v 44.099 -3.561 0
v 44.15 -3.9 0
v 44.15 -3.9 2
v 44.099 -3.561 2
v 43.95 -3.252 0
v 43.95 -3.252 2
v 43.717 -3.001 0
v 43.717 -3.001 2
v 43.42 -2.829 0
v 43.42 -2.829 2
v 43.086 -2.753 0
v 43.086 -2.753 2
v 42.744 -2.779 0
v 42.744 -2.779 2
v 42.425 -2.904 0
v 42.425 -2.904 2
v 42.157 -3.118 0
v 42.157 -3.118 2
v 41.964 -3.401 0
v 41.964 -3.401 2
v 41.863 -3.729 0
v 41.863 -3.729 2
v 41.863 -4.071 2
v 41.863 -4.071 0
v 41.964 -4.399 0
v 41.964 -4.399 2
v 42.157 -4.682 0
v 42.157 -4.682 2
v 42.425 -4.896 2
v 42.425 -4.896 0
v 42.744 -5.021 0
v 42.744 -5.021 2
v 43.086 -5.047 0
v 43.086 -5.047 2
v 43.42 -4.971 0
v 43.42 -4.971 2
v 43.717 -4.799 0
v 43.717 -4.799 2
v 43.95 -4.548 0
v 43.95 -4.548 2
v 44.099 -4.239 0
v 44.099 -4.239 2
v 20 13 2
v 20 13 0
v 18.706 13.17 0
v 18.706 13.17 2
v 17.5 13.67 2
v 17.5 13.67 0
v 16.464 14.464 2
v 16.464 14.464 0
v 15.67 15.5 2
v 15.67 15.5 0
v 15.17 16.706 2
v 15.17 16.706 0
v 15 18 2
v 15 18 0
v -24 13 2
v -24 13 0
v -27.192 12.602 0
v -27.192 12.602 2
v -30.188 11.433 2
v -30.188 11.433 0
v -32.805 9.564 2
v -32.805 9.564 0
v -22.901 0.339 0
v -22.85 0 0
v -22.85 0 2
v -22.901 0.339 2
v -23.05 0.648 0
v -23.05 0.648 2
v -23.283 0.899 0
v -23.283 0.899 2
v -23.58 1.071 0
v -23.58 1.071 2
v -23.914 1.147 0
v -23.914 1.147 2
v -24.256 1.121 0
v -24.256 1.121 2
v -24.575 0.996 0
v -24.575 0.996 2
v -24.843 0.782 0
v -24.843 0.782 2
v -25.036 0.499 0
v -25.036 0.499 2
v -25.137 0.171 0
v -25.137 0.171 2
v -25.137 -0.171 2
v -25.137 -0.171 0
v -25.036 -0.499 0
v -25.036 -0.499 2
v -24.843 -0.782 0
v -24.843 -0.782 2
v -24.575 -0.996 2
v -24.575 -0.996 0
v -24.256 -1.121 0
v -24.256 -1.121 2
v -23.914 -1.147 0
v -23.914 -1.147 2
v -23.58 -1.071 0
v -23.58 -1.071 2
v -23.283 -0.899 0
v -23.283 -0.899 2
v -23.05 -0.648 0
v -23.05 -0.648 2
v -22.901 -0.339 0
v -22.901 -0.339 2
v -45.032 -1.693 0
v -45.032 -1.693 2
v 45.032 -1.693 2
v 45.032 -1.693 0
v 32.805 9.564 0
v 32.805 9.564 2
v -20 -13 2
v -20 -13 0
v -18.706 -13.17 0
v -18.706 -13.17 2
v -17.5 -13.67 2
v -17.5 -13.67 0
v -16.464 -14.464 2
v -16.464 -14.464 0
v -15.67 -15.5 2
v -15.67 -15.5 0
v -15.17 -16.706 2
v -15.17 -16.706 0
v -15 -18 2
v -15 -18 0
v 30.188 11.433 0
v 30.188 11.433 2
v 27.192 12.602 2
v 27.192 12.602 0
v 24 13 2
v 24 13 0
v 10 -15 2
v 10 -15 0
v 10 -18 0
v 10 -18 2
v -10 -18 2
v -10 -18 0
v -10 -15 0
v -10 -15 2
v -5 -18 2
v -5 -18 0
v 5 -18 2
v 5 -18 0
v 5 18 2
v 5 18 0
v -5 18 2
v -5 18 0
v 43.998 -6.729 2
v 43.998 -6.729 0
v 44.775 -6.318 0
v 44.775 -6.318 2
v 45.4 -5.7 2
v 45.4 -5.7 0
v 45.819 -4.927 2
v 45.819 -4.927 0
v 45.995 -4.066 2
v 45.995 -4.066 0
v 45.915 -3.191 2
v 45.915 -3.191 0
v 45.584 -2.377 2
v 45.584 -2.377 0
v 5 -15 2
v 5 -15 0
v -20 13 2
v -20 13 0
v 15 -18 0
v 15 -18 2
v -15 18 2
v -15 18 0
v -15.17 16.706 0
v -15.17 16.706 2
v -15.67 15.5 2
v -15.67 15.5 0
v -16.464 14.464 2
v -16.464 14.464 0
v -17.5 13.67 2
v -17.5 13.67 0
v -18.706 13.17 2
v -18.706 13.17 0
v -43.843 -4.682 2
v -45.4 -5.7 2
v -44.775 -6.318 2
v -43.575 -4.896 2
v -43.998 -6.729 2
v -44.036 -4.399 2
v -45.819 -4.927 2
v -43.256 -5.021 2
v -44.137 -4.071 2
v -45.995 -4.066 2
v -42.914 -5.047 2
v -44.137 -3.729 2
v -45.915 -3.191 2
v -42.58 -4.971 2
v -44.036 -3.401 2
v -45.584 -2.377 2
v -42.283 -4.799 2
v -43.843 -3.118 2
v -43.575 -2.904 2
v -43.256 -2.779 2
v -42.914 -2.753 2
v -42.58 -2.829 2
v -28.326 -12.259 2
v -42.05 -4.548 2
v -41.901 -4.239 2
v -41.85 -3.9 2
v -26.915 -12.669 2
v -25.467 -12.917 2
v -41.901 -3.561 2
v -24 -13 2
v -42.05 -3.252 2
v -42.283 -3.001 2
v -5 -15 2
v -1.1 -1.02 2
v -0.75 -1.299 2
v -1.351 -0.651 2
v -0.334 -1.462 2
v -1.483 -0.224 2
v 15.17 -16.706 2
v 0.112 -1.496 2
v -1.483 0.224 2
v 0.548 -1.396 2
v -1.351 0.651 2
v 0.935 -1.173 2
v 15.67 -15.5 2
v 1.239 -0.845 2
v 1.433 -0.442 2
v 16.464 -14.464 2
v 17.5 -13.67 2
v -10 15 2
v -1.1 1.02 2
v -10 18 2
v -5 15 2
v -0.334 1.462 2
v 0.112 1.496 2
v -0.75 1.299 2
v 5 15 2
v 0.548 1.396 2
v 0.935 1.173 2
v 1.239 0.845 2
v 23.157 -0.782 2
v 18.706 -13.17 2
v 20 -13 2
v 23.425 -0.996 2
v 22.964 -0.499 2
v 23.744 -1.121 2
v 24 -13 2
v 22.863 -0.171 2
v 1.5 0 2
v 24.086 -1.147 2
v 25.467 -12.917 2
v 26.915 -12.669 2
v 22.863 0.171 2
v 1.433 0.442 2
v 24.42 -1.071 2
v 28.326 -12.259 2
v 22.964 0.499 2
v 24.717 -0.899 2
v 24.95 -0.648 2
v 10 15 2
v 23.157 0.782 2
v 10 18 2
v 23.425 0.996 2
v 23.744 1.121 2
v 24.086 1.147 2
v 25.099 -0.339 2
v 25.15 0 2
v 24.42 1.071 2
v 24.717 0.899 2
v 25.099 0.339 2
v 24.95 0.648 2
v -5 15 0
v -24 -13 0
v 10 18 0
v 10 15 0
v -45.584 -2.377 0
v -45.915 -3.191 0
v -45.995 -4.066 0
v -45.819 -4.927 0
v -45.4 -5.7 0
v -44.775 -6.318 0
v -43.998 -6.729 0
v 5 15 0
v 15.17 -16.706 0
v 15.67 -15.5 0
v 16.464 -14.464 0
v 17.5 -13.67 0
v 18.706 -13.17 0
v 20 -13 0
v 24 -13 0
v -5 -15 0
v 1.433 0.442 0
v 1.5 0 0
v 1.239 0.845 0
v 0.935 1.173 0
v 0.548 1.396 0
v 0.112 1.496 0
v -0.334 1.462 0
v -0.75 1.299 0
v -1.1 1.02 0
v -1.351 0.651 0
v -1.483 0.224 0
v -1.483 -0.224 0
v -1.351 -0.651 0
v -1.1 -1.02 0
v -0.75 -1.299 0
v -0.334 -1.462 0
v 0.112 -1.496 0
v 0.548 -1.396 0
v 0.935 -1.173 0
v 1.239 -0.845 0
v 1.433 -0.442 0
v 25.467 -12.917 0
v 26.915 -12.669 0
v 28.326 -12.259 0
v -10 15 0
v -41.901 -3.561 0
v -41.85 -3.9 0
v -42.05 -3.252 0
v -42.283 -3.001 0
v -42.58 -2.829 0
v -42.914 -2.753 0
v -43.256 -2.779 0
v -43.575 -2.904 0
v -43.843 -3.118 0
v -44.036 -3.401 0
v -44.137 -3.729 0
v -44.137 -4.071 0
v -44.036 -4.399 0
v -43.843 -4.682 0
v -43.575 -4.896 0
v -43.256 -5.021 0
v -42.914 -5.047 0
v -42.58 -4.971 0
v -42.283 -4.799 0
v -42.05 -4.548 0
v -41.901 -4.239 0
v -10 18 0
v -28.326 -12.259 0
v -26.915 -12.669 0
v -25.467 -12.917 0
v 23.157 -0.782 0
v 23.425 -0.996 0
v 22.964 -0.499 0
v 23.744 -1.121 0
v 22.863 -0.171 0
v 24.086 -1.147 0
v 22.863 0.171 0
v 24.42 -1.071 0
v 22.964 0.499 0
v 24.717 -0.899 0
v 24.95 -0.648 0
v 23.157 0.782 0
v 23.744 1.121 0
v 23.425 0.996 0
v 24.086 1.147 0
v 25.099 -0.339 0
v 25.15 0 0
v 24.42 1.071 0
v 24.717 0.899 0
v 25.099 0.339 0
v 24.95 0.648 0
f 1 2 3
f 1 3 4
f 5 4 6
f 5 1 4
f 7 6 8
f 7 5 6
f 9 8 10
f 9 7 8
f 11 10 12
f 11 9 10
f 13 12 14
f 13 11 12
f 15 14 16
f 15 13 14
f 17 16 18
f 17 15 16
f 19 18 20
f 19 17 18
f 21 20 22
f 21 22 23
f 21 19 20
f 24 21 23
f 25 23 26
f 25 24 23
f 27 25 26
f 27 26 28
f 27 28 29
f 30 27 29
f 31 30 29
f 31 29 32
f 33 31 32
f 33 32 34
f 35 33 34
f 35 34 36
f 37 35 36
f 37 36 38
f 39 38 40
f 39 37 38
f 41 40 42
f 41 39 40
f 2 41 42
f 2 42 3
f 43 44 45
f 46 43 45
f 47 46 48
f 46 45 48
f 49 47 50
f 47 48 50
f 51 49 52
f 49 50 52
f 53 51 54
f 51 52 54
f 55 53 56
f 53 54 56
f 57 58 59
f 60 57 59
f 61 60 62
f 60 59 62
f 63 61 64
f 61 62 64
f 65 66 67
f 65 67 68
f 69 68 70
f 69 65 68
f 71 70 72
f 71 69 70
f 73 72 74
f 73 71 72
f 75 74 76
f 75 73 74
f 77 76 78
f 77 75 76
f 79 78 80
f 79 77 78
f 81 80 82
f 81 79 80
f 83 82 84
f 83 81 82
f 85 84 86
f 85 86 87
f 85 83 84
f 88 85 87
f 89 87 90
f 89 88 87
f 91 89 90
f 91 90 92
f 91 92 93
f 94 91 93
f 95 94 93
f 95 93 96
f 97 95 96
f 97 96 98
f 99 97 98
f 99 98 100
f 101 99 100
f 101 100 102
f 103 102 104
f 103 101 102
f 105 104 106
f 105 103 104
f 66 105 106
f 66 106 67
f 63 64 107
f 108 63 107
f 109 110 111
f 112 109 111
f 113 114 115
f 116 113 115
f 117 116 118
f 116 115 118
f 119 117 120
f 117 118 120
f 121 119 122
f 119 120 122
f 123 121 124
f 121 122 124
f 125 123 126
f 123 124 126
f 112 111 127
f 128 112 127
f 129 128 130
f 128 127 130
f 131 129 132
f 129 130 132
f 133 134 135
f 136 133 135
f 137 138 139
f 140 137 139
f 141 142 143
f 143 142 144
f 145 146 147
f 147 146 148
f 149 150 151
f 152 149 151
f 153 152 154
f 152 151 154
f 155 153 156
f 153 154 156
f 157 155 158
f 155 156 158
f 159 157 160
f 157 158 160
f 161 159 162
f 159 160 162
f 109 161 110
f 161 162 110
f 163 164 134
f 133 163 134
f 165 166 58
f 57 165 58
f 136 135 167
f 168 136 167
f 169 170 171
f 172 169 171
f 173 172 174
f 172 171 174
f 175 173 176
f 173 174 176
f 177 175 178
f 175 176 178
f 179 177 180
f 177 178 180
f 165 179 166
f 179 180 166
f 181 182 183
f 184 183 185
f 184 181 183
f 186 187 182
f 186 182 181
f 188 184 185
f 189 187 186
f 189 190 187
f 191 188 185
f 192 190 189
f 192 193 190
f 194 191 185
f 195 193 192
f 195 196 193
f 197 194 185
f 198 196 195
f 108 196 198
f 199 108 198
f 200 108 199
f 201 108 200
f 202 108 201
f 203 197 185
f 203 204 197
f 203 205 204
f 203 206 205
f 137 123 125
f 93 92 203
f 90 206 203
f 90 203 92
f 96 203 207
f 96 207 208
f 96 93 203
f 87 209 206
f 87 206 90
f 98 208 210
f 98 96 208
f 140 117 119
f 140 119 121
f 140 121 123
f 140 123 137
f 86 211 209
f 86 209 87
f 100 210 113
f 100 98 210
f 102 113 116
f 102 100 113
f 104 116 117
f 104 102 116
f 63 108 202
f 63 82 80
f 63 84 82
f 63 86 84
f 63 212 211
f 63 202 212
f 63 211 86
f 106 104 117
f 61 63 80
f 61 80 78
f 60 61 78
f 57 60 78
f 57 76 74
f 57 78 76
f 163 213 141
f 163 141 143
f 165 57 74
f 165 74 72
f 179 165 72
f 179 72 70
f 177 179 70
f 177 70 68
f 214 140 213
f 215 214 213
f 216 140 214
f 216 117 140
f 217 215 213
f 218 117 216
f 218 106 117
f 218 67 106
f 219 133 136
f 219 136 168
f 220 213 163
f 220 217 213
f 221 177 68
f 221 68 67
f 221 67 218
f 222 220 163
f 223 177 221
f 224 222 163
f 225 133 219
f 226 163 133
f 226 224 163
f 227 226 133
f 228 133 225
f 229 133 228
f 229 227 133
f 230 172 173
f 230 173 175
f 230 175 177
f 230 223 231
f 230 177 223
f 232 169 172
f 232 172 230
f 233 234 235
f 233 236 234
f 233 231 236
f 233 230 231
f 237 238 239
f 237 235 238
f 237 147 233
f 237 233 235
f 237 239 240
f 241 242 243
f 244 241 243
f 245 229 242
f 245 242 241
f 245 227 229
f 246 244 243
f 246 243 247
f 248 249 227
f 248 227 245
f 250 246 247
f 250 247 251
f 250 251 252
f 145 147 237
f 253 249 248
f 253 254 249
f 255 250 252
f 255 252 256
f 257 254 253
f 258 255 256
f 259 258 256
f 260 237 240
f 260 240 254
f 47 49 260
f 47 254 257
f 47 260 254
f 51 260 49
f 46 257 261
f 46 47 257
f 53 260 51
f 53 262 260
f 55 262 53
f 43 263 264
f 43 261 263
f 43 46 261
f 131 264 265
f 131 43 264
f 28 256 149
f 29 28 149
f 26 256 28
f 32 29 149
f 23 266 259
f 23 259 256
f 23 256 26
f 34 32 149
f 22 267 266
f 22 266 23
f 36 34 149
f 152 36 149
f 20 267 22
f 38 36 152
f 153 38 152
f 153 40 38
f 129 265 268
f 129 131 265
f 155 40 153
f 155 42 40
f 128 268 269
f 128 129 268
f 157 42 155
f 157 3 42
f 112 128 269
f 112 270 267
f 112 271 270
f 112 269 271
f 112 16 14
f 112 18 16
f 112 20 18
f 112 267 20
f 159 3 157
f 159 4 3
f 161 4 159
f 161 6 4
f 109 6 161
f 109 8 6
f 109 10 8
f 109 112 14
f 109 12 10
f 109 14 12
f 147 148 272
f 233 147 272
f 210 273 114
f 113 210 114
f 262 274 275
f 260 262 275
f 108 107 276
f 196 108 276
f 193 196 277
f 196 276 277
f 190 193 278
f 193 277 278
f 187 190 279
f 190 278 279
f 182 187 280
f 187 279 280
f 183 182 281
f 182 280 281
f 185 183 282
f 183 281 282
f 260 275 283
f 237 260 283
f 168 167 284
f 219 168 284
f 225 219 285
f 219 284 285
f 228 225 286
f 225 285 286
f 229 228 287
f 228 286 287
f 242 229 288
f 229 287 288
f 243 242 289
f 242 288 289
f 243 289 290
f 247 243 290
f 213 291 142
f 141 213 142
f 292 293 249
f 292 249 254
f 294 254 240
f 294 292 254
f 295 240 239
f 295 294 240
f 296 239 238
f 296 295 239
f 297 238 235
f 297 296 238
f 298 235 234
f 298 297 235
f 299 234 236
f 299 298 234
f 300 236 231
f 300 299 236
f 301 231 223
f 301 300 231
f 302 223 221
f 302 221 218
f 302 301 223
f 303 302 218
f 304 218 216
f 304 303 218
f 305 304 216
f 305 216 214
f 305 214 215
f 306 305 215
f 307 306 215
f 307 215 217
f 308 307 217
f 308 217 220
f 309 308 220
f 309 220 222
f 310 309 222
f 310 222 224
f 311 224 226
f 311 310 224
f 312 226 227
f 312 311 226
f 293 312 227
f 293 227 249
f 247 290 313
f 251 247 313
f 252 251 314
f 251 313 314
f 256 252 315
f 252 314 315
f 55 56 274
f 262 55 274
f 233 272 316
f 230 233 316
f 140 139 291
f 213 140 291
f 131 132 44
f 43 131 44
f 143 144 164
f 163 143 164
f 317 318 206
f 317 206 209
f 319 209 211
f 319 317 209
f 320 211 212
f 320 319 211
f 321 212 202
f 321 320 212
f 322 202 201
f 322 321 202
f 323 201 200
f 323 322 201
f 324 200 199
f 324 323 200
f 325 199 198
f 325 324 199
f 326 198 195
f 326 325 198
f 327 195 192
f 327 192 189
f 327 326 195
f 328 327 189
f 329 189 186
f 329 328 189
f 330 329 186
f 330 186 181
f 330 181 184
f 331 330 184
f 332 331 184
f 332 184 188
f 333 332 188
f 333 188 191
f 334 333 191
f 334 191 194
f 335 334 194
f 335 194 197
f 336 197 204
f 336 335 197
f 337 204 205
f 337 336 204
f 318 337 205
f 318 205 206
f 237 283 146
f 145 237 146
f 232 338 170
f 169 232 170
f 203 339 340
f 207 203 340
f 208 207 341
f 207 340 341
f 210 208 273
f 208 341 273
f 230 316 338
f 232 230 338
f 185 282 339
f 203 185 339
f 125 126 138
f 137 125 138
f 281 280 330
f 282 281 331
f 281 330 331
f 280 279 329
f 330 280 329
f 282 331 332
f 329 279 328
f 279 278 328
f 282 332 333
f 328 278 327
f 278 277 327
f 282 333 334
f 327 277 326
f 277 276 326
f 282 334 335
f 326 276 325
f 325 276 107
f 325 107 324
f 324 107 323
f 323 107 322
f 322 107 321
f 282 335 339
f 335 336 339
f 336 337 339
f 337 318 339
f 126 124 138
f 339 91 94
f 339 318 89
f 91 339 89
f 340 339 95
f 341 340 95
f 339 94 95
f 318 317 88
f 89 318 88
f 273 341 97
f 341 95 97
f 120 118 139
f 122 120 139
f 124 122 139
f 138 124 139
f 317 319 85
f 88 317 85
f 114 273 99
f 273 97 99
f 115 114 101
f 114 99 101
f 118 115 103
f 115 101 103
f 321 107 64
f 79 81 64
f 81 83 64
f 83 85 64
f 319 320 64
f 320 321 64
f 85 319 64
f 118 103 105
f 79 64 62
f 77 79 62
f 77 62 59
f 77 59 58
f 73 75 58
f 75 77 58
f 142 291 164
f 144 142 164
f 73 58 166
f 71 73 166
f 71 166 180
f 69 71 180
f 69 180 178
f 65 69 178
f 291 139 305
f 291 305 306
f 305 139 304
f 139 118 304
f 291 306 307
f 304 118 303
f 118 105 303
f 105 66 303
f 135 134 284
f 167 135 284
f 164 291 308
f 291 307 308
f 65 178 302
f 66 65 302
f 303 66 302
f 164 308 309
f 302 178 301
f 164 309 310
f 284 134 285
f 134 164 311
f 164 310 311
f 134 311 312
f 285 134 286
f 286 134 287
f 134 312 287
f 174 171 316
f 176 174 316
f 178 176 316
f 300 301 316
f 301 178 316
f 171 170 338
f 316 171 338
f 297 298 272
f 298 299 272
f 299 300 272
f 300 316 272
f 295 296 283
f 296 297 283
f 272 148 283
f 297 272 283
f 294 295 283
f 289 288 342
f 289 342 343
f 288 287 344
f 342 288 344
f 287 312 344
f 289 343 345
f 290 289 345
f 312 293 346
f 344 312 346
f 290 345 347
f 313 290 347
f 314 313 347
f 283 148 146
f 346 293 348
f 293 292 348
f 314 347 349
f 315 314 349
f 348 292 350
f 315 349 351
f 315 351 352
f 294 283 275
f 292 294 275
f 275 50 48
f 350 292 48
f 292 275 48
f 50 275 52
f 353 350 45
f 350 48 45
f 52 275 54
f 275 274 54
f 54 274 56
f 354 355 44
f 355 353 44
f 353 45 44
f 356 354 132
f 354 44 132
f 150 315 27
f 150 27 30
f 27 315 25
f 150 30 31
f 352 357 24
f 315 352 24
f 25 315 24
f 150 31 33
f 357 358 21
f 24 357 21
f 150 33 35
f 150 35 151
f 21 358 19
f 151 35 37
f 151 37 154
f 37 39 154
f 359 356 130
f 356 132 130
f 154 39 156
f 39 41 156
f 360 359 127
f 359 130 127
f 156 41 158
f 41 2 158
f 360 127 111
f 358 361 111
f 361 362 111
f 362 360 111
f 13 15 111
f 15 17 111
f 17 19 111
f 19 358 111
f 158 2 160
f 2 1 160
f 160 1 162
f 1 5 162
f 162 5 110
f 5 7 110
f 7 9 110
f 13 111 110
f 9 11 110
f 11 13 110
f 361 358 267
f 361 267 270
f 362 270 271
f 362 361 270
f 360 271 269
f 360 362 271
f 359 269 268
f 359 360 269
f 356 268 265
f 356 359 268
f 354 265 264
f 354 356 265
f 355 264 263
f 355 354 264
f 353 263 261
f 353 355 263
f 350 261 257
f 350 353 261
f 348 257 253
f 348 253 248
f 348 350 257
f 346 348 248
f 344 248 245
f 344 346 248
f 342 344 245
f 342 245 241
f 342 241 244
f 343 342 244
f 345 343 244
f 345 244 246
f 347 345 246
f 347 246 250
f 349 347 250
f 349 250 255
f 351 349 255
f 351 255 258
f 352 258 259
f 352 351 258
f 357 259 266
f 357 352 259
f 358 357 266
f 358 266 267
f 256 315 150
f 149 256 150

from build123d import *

# Parameters (mm, degrees)
MODEL_R         = 1.15
MODEL_R_2       = 1.5
EXTRUDE_1_DEPTH = 2


with BuildPart() as part:
    # Model → Бобышка-Вытянуть1 (new body)
    # profile 1 of 3: a face of its own
    with BuildSketch(Plane.XY):
        with BuildLine():
            ThreePointArc((-11, 0), (-14.807611845, 9.192388155), (-24, 13))
            ThreePointArc((-24, 13), (-28.725958264, 12.110545755), (-32.805220584, 9.563895152))
            ThreePointArc((-32.805220584, 9.563895152), (-36.734496712, -2.613923009), (-28.325743505, -12.259198307))
            ThreePointArc((-28.325743505, -12.259198307), (-26.194358905, -12.813461242), (-24, -13))
            ThreePointArc((-24, -13), (-14.807611845, -9.192388155), (-11, 0))
        make_face()
        with Locations((-24, 0)):
            Circle(MODEL_R, mode=Mode.SUBTRACT)
    # profile 2 of 3: a face of its own
    with BuildSketch(Plane.XY):
        with BuildLine():
            ThreePointArc((-28.325743505, -12.259198307), (-36.734496712, -2.613923009), (-32.805220584, 9.563895152))
            Line((-32.805220584, 9.563895152), (-45.031973981, -1.692947273))
            ThreePointArc((-45.031973981, -1.692947273), (-45.93873001, -4.503213002), (-43.998248501, -6.729045763))
            Line((-43.998248501, -6.729045763), (-28.325743505, -12.259198307))
        make_face()
        with Locations((-43, -3.9)):
            Circle(MODEL_R, mode=Mode.SUBTRACT)
    # profile 3 of 3: a face of its own
    with BuildSketch(Plane.XY):
        with BuildLine():
            Line((-10, 18), (-15, 18))
            ThreePointArc((-15, 18), (-16.464466094, 14.464466094), (-20, 13))
            Line((-20, 13), (-24, 13))
            ThreePointArc((-24, 13), (-14.807611845, 9.192388155), (-11, 0))
            ThreePointArc((-11, 0), (-14.807611845, -9.192388155), (-24, -13))
            Line((-24, -13), (-20, -13))
            ThreePointArc((-20, -13), (-16.464466094, -14.464466094), (-15, -18))
            Line((-15, -18), (-10, -18))
            Line((-10, -18), (-10, -15))
            Line((-10, -15), (-5, -15))
            Line((-5, -15), (-5, -18))
            Line((-5, -18), (5, -18))
            Line((5, -18), (5, -15))
            Line((5, -15), (10, -15))
            Line((10, -15), (10, -18))
            Line((10, -18), (15, -18))
            ThreePointArc((15, -18), (16.464466094, -14.464466094), (20, -13))
            Line((20, -13), (24, -13))
            ThreePointArc((24, -13), (26.194358905, -12.813461242), (28.325743505, -12.259198307))
            Line((28.325743505, -12.259198307), (43.998248501, -6.729045763))
            ThreePointArc((43.998248501, -6.729045763), (45.93873001, -4.503213002), (45.031973981, -1.692947273))
            Line((45.031973981, -1.692947273), (32.805220584, 9.563895152))
            ThreePointArc((32.805220584, 9.563895152), (28.725958264, 12.110545755), (24, 13))
            Line((24, 13), (20, 13))
            ThreePointArc((20, 13), (16.464466094, 14.464466094), (15, 18))
            Line((15, 18), (10, 18))
            Line((10, 18), (10, 15))
            Line((10, 15), (5, 15))
            Line((5, 15), (5, 18))
            Line((5, 18), (-5, 18))
            Line((-5, 18), (-5, 15))
            Line((-5, 15), (-10, 15))
            Line((-10, 15), (-10, 18))
        make_face()
        with Locations((43, -3.9)):
            Circle(MODEL_R, mode=Mode.SUBTRACT)
        Circle(MODEL_R_2, mode=Mode.SUBTRACT)
        with Locations((24, 0)):
            Circle(MODEL_R, mode=Mode.SUBTRACT)
    extrude(amount=EXTRUDE_1_DEPTH)


solid = part.part
